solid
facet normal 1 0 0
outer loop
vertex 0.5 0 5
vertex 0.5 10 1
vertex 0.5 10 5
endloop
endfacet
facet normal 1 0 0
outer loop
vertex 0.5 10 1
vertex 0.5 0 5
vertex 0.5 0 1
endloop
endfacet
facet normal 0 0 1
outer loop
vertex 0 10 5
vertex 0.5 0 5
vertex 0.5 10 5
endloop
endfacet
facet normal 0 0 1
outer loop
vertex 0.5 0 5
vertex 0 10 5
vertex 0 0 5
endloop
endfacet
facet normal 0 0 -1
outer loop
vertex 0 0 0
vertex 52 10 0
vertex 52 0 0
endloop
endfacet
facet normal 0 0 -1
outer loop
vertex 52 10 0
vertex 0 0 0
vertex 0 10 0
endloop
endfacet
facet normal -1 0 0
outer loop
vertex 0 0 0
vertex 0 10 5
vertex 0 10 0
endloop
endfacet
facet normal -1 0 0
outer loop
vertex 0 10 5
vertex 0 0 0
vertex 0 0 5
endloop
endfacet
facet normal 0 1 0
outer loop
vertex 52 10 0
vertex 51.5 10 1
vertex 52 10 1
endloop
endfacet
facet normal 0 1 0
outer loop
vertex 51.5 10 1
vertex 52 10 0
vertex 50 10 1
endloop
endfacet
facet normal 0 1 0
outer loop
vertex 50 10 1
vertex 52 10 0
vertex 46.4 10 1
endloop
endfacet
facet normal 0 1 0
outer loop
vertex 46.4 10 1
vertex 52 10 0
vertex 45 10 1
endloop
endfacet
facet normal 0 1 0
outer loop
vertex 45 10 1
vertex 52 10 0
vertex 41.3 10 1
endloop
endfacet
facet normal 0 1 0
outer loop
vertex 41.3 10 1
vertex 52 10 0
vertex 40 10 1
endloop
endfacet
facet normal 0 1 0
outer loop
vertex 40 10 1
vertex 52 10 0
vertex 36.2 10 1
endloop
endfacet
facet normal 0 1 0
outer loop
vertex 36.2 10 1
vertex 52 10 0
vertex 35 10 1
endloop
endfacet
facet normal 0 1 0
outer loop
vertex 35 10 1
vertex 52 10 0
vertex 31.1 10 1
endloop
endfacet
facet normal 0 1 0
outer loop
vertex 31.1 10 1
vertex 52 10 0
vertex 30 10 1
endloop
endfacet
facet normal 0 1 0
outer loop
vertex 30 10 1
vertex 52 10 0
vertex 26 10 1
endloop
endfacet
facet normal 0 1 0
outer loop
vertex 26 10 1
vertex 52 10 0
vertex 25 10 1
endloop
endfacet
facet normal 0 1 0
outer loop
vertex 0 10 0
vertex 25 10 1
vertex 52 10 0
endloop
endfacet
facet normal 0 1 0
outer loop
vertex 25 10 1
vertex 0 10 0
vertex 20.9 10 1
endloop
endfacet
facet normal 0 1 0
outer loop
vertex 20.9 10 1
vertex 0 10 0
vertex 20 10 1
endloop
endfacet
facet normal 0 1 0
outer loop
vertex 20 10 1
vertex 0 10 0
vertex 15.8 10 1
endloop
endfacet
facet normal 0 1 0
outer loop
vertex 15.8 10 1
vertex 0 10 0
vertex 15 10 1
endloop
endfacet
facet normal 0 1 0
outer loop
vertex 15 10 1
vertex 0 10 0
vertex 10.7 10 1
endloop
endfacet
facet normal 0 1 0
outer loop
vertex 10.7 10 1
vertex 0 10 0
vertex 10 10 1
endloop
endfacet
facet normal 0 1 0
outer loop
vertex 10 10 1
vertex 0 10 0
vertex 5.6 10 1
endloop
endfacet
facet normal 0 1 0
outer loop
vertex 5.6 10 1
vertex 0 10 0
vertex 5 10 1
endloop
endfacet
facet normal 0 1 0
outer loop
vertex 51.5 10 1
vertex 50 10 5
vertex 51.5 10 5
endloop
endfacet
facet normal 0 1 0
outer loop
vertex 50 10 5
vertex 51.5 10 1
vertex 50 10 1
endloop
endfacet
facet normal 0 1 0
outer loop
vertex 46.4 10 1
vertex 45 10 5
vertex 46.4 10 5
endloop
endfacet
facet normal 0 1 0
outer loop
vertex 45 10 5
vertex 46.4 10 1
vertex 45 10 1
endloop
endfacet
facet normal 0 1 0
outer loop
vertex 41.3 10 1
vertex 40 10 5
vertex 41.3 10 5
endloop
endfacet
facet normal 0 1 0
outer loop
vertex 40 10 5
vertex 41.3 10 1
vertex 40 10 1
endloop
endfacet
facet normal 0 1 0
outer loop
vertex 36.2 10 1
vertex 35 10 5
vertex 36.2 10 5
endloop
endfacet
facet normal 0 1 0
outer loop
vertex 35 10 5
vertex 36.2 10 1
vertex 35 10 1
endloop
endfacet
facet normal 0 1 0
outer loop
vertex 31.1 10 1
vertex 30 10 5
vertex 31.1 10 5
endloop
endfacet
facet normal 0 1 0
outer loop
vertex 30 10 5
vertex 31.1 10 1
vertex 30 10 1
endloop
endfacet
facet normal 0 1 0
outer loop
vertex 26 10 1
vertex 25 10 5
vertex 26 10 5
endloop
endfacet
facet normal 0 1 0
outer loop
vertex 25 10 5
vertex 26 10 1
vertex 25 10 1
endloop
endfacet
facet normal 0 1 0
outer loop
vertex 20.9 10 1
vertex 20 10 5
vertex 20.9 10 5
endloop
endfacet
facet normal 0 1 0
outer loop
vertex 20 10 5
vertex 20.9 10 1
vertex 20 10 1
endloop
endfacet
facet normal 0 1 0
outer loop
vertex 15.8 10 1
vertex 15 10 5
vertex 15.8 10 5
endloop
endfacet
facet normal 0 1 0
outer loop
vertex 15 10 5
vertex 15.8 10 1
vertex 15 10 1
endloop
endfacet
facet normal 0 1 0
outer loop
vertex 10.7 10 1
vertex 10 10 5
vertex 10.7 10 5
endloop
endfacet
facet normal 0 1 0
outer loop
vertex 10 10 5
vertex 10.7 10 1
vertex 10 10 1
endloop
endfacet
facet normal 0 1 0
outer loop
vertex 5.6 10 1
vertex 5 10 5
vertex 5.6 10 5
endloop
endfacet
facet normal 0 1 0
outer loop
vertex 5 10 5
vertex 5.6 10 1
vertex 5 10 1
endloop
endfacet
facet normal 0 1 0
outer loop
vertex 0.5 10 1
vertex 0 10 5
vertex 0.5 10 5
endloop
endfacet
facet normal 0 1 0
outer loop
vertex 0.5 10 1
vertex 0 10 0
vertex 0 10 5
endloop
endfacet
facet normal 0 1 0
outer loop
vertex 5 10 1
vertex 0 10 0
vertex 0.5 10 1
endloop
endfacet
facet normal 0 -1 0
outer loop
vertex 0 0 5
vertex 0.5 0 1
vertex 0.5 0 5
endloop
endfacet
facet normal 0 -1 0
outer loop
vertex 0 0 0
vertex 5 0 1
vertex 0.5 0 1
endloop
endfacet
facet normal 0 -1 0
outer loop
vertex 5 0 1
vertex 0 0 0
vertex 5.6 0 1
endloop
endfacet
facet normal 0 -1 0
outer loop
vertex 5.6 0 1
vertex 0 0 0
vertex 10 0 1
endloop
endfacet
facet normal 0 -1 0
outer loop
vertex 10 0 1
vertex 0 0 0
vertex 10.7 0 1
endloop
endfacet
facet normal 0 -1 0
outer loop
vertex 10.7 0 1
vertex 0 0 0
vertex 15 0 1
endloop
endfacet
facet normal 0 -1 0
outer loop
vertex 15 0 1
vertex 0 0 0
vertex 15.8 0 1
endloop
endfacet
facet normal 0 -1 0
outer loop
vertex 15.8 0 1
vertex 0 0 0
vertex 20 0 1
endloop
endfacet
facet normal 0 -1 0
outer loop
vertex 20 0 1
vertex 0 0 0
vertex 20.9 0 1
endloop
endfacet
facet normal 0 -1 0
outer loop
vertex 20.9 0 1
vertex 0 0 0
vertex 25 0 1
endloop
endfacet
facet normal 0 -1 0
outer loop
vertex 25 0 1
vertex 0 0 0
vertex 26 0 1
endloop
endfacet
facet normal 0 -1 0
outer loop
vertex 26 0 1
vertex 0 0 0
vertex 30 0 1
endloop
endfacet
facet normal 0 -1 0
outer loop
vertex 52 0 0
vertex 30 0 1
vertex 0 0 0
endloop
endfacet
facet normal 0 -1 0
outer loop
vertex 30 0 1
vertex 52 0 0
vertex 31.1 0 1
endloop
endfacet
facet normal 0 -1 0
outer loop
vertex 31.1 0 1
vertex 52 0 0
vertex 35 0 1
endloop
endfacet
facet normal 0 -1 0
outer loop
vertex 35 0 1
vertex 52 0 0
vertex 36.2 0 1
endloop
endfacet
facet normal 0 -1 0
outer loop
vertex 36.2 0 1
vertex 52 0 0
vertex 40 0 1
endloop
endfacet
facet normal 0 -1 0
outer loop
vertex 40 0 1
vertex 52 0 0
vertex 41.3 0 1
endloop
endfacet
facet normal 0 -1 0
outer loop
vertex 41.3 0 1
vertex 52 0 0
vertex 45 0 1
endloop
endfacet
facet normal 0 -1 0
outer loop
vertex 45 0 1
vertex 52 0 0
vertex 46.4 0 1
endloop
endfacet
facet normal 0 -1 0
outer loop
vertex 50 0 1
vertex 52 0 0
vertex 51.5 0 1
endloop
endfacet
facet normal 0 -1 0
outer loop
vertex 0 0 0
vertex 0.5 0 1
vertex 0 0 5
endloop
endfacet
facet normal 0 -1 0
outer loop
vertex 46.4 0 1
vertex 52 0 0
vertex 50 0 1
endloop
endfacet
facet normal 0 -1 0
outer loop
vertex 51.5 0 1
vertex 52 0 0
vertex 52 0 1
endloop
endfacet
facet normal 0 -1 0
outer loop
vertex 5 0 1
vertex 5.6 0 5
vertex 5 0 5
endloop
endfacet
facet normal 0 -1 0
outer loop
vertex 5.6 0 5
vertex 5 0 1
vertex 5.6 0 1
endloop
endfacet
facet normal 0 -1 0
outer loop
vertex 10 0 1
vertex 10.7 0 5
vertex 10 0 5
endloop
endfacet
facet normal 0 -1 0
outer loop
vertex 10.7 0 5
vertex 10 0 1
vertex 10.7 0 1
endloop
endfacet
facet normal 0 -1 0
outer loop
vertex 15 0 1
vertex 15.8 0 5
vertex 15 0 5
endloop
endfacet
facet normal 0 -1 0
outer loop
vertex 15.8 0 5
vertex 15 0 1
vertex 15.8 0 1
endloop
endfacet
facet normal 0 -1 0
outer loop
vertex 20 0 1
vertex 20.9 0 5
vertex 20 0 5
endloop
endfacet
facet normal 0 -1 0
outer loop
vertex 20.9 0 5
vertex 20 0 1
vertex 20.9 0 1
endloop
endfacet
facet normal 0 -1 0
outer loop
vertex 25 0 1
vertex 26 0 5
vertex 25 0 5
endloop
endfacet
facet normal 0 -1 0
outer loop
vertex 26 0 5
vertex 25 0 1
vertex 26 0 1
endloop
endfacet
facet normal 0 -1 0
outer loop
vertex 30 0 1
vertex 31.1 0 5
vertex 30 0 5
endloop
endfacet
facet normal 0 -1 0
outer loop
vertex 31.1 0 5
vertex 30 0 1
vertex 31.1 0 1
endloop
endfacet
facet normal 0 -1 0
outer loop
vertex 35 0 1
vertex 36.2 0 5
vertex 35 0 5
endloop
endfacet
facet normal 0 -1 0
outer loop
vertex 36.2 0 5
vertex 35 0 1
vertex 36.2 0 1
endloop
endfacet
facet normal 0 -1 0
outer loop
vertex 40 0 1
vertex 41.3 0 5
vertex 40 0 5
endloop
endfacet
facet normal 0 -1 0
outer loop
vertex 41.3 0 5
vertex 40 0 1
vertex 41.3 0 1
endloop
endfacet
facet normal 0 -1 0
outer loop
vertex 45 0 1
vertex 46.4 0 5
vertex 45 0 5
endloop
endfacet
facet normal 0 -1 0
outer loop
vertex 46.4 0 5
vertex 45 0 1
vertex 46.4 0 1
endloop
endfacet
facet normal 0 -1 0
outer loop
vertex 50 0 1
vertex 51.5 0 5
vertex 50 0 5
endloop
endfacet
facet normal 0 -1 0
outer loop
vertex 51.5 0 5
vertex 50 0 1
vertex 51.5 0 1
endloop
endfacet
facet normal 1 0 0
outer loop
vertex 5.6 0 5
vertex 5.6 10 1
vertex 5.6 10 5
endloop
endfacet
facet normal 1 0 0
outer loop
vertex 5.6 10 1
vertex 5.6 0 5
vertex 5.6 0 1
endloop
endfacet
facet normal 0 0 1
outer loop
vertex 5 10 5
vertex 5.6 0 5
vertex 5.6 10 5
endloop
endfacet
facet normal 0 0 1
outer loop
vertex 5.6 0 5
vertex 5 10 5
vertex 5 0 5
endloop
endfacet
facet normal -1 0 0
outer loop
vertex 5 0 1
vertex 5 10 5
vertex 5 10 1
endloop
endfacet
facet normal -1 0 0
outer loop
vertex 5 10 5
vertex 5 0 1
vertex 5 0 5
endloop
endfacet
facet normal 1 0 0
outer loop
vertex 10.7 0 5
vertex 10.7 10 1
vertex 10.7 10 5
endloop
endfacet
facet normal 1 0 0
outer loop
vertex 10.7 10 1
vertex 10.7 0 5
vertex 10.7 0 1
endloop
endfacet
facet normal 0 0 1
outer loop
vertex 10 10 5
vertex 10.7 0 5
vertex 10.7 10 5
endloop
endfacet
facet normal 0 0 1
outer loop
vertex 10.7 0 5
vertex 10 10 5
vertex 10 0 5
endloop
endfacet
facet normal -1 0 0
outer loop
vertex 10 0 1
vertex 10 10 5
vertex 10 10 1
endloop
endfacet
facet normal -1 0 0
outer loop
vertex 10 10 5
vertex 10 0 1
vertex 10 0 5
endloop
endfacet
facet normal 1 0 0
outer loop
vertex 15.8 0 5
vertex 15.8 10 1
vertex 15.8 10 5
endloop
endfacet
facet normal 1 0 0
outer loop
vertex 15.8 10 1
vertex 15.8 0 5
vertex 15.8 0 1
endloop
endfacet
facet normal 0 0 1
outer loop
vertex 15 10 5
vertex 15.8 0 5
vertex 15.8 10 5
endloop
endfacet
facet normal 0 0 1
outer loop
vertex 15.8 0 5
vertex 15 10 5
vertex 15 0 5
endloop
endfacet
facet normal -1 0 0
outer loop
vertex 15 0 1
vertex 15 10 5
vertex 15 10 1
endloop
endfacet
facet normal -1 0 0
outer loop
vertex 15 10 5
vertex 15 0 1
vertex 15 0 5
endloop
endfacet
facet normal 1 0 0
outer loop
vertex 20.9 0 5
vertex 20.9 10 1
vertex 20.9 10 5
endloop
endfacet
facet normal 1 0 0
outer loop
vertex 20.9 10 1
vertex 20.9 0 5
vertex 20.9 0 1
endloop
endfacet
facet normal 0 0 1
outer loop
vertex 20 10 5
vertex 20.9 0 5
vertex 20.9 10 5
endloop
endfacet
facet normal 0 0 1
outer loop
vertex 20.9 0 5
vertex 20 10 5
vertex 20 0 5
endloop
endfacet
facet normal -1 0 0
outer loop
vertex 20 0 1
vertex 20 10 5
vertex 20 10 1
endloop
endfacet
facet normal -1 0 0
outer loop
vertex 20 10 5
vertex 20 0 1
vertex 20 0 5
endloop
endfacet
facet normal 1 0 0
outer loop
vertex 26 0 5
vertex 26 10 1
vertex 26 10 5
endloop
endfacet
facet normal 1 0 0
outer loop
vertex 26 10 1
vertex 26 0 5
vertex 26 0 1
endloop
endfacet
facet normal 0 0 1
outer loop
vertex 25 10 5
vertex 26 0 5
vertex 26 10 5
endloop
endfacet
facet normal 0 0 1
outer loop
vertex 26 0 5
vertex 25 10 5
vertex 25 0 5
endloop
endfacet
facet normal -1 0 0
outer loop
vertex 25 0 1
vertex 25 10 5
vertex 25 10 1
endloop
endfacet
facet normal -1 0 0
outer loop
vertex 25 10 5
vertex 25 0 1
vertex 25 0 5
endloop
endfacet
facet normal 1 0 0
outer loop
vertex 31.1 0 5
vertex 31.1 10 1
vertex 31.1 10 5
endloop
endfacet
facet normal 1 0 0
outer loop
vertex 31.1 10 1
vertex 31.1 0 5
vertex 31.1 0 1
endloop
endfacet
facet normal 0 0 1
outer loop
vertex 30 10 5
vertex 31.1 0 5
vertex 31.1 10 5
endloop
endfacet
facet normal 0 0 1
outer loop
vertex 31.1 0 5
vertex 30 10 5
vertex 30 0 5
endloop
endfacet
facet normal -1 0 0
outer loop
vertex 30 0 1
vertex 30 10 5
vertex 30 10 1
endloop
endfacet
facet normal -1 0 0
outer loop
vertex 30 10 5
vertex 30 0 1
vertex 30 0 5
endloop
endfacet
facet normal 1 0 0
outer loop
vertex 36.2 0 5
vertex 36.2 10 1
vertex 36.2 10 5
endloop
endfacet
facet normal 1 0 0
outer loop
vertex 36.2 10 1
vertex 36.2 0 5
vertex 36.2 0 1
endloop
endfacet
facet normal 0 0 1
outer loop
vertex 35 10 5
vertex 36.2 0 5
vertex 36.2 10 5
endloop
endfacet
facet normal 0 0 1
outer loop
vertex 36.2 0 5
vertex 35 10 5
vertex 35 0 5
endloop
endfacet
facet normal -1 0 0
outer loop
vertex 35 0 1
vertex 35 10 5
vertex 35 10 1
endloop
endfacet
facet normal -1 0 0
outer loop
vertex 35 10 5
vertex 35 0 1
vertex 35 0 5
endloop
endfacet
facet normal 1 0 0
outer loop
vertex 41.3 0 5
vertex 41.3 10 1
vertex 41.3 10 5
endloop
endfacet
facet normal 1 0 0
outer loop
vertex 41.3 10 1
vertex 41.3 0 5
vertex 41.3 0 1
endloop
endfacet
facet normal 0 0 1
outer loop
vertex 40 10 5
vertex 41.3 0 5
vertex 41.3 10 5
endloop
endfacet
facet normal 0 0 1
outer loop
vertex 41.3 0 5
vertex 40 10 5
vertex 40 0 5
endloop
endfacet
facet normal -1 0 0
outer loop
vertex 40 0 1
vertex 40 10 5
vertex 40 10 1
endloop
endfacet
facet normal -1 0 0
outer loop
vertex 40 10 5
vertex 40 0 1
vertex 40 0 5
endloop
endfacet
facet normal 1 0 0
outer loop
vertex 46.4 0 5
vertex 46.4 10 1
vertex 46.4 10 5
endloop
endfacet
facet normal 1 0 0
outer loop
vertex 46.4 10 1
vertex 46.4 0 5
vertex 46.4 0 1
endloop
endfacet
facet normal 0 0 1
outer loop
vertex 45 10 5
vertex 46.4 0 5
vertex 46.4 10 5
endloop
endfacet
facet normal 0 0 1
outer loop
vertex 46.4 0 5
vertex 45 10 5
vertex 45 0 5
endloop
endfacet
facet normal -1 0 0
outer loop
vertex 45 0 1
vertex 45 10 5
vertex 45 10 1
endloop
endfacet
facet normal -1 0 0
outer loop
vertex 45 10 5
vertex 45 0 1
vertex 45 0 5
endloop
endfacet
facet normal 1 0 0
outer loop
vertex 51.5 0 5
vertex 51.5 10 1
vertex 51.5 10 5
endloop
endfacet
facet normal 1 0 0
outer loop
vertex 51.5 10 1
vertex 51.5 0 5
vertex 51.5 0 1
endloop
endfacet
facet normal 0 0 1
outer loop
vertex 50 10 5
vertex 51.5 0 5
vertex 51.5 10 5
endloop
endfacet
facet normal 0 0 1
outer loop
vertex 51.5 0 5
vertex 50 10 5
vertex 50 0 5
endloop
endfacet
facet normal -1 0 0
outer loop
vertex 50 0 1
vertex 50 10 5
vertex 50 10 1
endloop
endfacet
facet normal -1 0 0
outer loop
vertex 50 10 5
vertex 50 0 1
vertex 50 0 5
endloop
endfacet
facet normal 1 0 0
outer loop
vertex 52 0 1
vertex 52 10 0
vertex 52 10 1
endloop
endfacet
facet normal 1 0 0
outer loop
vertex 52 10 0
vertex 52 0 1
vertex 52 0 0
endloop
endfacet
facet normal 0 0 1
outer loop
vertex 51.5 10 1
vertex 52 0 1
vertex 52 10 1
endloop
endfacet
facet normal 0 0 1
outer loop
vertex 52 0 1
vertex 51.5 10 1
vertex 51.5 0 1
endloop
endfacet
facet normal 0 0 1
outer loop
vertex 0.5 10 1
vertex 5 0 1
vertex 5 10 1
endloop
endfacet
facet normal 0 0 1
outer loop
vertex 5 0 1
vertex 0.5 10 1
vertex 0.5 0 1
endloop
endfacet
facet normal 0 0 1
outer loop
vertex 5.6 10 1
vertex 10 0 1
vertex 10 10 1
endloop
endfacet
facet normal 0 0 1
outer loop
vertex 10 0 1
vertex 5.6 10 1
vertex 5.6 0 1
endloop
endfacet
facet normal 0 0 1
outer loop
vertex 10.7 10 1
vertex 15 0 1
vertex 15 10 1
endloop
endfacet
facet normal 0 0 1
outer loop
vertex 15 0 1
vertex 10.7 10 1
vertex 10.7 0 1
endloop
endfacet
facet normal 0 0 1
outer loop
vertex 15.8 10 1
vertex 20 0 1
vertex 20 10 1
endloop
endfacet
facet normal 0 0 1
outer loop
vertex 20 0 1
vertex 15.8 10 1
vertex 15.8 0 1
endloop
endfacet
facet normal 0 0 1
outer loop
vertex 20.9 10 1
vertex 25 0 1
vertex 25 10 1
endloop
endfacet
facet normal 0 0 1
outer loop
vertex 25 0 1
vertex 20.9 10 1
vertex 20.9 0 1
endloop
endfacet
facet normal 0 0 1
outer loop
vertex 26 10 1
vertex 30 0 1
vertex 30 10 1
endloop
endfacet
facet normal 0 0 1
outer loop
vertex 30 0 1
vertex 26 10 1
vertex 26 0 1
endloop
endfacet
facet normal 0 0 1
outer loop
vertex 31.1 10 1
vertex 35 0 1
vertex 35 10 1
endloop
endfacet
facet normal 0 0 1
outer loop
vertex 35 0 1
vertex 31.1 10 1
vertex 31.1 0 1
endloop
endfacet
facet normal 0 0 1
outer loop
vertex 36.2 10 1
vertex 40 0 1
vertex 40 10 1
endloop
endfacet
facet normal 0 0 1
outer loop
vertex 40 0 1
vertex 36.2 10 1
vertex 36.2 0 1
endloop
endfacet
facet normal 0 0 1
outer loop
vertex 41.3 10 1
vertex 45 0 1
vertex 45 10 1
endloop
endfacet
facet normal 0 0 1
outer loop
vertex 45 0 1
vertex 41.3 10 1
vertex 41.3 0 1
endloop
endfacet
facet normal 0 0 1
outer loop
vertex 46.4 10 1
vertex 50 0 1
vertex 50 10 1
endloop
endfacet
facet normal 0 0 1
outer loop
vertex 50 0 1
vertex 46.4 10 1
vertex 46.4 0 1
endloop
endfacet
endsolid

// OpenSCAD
for(i = [0:10]) {
	translate([5 * i, 0, 0]) {
		cube([0.5 + 0.1 * i, 10, 5]);
	}
}
cube([52, 10, 1]);
